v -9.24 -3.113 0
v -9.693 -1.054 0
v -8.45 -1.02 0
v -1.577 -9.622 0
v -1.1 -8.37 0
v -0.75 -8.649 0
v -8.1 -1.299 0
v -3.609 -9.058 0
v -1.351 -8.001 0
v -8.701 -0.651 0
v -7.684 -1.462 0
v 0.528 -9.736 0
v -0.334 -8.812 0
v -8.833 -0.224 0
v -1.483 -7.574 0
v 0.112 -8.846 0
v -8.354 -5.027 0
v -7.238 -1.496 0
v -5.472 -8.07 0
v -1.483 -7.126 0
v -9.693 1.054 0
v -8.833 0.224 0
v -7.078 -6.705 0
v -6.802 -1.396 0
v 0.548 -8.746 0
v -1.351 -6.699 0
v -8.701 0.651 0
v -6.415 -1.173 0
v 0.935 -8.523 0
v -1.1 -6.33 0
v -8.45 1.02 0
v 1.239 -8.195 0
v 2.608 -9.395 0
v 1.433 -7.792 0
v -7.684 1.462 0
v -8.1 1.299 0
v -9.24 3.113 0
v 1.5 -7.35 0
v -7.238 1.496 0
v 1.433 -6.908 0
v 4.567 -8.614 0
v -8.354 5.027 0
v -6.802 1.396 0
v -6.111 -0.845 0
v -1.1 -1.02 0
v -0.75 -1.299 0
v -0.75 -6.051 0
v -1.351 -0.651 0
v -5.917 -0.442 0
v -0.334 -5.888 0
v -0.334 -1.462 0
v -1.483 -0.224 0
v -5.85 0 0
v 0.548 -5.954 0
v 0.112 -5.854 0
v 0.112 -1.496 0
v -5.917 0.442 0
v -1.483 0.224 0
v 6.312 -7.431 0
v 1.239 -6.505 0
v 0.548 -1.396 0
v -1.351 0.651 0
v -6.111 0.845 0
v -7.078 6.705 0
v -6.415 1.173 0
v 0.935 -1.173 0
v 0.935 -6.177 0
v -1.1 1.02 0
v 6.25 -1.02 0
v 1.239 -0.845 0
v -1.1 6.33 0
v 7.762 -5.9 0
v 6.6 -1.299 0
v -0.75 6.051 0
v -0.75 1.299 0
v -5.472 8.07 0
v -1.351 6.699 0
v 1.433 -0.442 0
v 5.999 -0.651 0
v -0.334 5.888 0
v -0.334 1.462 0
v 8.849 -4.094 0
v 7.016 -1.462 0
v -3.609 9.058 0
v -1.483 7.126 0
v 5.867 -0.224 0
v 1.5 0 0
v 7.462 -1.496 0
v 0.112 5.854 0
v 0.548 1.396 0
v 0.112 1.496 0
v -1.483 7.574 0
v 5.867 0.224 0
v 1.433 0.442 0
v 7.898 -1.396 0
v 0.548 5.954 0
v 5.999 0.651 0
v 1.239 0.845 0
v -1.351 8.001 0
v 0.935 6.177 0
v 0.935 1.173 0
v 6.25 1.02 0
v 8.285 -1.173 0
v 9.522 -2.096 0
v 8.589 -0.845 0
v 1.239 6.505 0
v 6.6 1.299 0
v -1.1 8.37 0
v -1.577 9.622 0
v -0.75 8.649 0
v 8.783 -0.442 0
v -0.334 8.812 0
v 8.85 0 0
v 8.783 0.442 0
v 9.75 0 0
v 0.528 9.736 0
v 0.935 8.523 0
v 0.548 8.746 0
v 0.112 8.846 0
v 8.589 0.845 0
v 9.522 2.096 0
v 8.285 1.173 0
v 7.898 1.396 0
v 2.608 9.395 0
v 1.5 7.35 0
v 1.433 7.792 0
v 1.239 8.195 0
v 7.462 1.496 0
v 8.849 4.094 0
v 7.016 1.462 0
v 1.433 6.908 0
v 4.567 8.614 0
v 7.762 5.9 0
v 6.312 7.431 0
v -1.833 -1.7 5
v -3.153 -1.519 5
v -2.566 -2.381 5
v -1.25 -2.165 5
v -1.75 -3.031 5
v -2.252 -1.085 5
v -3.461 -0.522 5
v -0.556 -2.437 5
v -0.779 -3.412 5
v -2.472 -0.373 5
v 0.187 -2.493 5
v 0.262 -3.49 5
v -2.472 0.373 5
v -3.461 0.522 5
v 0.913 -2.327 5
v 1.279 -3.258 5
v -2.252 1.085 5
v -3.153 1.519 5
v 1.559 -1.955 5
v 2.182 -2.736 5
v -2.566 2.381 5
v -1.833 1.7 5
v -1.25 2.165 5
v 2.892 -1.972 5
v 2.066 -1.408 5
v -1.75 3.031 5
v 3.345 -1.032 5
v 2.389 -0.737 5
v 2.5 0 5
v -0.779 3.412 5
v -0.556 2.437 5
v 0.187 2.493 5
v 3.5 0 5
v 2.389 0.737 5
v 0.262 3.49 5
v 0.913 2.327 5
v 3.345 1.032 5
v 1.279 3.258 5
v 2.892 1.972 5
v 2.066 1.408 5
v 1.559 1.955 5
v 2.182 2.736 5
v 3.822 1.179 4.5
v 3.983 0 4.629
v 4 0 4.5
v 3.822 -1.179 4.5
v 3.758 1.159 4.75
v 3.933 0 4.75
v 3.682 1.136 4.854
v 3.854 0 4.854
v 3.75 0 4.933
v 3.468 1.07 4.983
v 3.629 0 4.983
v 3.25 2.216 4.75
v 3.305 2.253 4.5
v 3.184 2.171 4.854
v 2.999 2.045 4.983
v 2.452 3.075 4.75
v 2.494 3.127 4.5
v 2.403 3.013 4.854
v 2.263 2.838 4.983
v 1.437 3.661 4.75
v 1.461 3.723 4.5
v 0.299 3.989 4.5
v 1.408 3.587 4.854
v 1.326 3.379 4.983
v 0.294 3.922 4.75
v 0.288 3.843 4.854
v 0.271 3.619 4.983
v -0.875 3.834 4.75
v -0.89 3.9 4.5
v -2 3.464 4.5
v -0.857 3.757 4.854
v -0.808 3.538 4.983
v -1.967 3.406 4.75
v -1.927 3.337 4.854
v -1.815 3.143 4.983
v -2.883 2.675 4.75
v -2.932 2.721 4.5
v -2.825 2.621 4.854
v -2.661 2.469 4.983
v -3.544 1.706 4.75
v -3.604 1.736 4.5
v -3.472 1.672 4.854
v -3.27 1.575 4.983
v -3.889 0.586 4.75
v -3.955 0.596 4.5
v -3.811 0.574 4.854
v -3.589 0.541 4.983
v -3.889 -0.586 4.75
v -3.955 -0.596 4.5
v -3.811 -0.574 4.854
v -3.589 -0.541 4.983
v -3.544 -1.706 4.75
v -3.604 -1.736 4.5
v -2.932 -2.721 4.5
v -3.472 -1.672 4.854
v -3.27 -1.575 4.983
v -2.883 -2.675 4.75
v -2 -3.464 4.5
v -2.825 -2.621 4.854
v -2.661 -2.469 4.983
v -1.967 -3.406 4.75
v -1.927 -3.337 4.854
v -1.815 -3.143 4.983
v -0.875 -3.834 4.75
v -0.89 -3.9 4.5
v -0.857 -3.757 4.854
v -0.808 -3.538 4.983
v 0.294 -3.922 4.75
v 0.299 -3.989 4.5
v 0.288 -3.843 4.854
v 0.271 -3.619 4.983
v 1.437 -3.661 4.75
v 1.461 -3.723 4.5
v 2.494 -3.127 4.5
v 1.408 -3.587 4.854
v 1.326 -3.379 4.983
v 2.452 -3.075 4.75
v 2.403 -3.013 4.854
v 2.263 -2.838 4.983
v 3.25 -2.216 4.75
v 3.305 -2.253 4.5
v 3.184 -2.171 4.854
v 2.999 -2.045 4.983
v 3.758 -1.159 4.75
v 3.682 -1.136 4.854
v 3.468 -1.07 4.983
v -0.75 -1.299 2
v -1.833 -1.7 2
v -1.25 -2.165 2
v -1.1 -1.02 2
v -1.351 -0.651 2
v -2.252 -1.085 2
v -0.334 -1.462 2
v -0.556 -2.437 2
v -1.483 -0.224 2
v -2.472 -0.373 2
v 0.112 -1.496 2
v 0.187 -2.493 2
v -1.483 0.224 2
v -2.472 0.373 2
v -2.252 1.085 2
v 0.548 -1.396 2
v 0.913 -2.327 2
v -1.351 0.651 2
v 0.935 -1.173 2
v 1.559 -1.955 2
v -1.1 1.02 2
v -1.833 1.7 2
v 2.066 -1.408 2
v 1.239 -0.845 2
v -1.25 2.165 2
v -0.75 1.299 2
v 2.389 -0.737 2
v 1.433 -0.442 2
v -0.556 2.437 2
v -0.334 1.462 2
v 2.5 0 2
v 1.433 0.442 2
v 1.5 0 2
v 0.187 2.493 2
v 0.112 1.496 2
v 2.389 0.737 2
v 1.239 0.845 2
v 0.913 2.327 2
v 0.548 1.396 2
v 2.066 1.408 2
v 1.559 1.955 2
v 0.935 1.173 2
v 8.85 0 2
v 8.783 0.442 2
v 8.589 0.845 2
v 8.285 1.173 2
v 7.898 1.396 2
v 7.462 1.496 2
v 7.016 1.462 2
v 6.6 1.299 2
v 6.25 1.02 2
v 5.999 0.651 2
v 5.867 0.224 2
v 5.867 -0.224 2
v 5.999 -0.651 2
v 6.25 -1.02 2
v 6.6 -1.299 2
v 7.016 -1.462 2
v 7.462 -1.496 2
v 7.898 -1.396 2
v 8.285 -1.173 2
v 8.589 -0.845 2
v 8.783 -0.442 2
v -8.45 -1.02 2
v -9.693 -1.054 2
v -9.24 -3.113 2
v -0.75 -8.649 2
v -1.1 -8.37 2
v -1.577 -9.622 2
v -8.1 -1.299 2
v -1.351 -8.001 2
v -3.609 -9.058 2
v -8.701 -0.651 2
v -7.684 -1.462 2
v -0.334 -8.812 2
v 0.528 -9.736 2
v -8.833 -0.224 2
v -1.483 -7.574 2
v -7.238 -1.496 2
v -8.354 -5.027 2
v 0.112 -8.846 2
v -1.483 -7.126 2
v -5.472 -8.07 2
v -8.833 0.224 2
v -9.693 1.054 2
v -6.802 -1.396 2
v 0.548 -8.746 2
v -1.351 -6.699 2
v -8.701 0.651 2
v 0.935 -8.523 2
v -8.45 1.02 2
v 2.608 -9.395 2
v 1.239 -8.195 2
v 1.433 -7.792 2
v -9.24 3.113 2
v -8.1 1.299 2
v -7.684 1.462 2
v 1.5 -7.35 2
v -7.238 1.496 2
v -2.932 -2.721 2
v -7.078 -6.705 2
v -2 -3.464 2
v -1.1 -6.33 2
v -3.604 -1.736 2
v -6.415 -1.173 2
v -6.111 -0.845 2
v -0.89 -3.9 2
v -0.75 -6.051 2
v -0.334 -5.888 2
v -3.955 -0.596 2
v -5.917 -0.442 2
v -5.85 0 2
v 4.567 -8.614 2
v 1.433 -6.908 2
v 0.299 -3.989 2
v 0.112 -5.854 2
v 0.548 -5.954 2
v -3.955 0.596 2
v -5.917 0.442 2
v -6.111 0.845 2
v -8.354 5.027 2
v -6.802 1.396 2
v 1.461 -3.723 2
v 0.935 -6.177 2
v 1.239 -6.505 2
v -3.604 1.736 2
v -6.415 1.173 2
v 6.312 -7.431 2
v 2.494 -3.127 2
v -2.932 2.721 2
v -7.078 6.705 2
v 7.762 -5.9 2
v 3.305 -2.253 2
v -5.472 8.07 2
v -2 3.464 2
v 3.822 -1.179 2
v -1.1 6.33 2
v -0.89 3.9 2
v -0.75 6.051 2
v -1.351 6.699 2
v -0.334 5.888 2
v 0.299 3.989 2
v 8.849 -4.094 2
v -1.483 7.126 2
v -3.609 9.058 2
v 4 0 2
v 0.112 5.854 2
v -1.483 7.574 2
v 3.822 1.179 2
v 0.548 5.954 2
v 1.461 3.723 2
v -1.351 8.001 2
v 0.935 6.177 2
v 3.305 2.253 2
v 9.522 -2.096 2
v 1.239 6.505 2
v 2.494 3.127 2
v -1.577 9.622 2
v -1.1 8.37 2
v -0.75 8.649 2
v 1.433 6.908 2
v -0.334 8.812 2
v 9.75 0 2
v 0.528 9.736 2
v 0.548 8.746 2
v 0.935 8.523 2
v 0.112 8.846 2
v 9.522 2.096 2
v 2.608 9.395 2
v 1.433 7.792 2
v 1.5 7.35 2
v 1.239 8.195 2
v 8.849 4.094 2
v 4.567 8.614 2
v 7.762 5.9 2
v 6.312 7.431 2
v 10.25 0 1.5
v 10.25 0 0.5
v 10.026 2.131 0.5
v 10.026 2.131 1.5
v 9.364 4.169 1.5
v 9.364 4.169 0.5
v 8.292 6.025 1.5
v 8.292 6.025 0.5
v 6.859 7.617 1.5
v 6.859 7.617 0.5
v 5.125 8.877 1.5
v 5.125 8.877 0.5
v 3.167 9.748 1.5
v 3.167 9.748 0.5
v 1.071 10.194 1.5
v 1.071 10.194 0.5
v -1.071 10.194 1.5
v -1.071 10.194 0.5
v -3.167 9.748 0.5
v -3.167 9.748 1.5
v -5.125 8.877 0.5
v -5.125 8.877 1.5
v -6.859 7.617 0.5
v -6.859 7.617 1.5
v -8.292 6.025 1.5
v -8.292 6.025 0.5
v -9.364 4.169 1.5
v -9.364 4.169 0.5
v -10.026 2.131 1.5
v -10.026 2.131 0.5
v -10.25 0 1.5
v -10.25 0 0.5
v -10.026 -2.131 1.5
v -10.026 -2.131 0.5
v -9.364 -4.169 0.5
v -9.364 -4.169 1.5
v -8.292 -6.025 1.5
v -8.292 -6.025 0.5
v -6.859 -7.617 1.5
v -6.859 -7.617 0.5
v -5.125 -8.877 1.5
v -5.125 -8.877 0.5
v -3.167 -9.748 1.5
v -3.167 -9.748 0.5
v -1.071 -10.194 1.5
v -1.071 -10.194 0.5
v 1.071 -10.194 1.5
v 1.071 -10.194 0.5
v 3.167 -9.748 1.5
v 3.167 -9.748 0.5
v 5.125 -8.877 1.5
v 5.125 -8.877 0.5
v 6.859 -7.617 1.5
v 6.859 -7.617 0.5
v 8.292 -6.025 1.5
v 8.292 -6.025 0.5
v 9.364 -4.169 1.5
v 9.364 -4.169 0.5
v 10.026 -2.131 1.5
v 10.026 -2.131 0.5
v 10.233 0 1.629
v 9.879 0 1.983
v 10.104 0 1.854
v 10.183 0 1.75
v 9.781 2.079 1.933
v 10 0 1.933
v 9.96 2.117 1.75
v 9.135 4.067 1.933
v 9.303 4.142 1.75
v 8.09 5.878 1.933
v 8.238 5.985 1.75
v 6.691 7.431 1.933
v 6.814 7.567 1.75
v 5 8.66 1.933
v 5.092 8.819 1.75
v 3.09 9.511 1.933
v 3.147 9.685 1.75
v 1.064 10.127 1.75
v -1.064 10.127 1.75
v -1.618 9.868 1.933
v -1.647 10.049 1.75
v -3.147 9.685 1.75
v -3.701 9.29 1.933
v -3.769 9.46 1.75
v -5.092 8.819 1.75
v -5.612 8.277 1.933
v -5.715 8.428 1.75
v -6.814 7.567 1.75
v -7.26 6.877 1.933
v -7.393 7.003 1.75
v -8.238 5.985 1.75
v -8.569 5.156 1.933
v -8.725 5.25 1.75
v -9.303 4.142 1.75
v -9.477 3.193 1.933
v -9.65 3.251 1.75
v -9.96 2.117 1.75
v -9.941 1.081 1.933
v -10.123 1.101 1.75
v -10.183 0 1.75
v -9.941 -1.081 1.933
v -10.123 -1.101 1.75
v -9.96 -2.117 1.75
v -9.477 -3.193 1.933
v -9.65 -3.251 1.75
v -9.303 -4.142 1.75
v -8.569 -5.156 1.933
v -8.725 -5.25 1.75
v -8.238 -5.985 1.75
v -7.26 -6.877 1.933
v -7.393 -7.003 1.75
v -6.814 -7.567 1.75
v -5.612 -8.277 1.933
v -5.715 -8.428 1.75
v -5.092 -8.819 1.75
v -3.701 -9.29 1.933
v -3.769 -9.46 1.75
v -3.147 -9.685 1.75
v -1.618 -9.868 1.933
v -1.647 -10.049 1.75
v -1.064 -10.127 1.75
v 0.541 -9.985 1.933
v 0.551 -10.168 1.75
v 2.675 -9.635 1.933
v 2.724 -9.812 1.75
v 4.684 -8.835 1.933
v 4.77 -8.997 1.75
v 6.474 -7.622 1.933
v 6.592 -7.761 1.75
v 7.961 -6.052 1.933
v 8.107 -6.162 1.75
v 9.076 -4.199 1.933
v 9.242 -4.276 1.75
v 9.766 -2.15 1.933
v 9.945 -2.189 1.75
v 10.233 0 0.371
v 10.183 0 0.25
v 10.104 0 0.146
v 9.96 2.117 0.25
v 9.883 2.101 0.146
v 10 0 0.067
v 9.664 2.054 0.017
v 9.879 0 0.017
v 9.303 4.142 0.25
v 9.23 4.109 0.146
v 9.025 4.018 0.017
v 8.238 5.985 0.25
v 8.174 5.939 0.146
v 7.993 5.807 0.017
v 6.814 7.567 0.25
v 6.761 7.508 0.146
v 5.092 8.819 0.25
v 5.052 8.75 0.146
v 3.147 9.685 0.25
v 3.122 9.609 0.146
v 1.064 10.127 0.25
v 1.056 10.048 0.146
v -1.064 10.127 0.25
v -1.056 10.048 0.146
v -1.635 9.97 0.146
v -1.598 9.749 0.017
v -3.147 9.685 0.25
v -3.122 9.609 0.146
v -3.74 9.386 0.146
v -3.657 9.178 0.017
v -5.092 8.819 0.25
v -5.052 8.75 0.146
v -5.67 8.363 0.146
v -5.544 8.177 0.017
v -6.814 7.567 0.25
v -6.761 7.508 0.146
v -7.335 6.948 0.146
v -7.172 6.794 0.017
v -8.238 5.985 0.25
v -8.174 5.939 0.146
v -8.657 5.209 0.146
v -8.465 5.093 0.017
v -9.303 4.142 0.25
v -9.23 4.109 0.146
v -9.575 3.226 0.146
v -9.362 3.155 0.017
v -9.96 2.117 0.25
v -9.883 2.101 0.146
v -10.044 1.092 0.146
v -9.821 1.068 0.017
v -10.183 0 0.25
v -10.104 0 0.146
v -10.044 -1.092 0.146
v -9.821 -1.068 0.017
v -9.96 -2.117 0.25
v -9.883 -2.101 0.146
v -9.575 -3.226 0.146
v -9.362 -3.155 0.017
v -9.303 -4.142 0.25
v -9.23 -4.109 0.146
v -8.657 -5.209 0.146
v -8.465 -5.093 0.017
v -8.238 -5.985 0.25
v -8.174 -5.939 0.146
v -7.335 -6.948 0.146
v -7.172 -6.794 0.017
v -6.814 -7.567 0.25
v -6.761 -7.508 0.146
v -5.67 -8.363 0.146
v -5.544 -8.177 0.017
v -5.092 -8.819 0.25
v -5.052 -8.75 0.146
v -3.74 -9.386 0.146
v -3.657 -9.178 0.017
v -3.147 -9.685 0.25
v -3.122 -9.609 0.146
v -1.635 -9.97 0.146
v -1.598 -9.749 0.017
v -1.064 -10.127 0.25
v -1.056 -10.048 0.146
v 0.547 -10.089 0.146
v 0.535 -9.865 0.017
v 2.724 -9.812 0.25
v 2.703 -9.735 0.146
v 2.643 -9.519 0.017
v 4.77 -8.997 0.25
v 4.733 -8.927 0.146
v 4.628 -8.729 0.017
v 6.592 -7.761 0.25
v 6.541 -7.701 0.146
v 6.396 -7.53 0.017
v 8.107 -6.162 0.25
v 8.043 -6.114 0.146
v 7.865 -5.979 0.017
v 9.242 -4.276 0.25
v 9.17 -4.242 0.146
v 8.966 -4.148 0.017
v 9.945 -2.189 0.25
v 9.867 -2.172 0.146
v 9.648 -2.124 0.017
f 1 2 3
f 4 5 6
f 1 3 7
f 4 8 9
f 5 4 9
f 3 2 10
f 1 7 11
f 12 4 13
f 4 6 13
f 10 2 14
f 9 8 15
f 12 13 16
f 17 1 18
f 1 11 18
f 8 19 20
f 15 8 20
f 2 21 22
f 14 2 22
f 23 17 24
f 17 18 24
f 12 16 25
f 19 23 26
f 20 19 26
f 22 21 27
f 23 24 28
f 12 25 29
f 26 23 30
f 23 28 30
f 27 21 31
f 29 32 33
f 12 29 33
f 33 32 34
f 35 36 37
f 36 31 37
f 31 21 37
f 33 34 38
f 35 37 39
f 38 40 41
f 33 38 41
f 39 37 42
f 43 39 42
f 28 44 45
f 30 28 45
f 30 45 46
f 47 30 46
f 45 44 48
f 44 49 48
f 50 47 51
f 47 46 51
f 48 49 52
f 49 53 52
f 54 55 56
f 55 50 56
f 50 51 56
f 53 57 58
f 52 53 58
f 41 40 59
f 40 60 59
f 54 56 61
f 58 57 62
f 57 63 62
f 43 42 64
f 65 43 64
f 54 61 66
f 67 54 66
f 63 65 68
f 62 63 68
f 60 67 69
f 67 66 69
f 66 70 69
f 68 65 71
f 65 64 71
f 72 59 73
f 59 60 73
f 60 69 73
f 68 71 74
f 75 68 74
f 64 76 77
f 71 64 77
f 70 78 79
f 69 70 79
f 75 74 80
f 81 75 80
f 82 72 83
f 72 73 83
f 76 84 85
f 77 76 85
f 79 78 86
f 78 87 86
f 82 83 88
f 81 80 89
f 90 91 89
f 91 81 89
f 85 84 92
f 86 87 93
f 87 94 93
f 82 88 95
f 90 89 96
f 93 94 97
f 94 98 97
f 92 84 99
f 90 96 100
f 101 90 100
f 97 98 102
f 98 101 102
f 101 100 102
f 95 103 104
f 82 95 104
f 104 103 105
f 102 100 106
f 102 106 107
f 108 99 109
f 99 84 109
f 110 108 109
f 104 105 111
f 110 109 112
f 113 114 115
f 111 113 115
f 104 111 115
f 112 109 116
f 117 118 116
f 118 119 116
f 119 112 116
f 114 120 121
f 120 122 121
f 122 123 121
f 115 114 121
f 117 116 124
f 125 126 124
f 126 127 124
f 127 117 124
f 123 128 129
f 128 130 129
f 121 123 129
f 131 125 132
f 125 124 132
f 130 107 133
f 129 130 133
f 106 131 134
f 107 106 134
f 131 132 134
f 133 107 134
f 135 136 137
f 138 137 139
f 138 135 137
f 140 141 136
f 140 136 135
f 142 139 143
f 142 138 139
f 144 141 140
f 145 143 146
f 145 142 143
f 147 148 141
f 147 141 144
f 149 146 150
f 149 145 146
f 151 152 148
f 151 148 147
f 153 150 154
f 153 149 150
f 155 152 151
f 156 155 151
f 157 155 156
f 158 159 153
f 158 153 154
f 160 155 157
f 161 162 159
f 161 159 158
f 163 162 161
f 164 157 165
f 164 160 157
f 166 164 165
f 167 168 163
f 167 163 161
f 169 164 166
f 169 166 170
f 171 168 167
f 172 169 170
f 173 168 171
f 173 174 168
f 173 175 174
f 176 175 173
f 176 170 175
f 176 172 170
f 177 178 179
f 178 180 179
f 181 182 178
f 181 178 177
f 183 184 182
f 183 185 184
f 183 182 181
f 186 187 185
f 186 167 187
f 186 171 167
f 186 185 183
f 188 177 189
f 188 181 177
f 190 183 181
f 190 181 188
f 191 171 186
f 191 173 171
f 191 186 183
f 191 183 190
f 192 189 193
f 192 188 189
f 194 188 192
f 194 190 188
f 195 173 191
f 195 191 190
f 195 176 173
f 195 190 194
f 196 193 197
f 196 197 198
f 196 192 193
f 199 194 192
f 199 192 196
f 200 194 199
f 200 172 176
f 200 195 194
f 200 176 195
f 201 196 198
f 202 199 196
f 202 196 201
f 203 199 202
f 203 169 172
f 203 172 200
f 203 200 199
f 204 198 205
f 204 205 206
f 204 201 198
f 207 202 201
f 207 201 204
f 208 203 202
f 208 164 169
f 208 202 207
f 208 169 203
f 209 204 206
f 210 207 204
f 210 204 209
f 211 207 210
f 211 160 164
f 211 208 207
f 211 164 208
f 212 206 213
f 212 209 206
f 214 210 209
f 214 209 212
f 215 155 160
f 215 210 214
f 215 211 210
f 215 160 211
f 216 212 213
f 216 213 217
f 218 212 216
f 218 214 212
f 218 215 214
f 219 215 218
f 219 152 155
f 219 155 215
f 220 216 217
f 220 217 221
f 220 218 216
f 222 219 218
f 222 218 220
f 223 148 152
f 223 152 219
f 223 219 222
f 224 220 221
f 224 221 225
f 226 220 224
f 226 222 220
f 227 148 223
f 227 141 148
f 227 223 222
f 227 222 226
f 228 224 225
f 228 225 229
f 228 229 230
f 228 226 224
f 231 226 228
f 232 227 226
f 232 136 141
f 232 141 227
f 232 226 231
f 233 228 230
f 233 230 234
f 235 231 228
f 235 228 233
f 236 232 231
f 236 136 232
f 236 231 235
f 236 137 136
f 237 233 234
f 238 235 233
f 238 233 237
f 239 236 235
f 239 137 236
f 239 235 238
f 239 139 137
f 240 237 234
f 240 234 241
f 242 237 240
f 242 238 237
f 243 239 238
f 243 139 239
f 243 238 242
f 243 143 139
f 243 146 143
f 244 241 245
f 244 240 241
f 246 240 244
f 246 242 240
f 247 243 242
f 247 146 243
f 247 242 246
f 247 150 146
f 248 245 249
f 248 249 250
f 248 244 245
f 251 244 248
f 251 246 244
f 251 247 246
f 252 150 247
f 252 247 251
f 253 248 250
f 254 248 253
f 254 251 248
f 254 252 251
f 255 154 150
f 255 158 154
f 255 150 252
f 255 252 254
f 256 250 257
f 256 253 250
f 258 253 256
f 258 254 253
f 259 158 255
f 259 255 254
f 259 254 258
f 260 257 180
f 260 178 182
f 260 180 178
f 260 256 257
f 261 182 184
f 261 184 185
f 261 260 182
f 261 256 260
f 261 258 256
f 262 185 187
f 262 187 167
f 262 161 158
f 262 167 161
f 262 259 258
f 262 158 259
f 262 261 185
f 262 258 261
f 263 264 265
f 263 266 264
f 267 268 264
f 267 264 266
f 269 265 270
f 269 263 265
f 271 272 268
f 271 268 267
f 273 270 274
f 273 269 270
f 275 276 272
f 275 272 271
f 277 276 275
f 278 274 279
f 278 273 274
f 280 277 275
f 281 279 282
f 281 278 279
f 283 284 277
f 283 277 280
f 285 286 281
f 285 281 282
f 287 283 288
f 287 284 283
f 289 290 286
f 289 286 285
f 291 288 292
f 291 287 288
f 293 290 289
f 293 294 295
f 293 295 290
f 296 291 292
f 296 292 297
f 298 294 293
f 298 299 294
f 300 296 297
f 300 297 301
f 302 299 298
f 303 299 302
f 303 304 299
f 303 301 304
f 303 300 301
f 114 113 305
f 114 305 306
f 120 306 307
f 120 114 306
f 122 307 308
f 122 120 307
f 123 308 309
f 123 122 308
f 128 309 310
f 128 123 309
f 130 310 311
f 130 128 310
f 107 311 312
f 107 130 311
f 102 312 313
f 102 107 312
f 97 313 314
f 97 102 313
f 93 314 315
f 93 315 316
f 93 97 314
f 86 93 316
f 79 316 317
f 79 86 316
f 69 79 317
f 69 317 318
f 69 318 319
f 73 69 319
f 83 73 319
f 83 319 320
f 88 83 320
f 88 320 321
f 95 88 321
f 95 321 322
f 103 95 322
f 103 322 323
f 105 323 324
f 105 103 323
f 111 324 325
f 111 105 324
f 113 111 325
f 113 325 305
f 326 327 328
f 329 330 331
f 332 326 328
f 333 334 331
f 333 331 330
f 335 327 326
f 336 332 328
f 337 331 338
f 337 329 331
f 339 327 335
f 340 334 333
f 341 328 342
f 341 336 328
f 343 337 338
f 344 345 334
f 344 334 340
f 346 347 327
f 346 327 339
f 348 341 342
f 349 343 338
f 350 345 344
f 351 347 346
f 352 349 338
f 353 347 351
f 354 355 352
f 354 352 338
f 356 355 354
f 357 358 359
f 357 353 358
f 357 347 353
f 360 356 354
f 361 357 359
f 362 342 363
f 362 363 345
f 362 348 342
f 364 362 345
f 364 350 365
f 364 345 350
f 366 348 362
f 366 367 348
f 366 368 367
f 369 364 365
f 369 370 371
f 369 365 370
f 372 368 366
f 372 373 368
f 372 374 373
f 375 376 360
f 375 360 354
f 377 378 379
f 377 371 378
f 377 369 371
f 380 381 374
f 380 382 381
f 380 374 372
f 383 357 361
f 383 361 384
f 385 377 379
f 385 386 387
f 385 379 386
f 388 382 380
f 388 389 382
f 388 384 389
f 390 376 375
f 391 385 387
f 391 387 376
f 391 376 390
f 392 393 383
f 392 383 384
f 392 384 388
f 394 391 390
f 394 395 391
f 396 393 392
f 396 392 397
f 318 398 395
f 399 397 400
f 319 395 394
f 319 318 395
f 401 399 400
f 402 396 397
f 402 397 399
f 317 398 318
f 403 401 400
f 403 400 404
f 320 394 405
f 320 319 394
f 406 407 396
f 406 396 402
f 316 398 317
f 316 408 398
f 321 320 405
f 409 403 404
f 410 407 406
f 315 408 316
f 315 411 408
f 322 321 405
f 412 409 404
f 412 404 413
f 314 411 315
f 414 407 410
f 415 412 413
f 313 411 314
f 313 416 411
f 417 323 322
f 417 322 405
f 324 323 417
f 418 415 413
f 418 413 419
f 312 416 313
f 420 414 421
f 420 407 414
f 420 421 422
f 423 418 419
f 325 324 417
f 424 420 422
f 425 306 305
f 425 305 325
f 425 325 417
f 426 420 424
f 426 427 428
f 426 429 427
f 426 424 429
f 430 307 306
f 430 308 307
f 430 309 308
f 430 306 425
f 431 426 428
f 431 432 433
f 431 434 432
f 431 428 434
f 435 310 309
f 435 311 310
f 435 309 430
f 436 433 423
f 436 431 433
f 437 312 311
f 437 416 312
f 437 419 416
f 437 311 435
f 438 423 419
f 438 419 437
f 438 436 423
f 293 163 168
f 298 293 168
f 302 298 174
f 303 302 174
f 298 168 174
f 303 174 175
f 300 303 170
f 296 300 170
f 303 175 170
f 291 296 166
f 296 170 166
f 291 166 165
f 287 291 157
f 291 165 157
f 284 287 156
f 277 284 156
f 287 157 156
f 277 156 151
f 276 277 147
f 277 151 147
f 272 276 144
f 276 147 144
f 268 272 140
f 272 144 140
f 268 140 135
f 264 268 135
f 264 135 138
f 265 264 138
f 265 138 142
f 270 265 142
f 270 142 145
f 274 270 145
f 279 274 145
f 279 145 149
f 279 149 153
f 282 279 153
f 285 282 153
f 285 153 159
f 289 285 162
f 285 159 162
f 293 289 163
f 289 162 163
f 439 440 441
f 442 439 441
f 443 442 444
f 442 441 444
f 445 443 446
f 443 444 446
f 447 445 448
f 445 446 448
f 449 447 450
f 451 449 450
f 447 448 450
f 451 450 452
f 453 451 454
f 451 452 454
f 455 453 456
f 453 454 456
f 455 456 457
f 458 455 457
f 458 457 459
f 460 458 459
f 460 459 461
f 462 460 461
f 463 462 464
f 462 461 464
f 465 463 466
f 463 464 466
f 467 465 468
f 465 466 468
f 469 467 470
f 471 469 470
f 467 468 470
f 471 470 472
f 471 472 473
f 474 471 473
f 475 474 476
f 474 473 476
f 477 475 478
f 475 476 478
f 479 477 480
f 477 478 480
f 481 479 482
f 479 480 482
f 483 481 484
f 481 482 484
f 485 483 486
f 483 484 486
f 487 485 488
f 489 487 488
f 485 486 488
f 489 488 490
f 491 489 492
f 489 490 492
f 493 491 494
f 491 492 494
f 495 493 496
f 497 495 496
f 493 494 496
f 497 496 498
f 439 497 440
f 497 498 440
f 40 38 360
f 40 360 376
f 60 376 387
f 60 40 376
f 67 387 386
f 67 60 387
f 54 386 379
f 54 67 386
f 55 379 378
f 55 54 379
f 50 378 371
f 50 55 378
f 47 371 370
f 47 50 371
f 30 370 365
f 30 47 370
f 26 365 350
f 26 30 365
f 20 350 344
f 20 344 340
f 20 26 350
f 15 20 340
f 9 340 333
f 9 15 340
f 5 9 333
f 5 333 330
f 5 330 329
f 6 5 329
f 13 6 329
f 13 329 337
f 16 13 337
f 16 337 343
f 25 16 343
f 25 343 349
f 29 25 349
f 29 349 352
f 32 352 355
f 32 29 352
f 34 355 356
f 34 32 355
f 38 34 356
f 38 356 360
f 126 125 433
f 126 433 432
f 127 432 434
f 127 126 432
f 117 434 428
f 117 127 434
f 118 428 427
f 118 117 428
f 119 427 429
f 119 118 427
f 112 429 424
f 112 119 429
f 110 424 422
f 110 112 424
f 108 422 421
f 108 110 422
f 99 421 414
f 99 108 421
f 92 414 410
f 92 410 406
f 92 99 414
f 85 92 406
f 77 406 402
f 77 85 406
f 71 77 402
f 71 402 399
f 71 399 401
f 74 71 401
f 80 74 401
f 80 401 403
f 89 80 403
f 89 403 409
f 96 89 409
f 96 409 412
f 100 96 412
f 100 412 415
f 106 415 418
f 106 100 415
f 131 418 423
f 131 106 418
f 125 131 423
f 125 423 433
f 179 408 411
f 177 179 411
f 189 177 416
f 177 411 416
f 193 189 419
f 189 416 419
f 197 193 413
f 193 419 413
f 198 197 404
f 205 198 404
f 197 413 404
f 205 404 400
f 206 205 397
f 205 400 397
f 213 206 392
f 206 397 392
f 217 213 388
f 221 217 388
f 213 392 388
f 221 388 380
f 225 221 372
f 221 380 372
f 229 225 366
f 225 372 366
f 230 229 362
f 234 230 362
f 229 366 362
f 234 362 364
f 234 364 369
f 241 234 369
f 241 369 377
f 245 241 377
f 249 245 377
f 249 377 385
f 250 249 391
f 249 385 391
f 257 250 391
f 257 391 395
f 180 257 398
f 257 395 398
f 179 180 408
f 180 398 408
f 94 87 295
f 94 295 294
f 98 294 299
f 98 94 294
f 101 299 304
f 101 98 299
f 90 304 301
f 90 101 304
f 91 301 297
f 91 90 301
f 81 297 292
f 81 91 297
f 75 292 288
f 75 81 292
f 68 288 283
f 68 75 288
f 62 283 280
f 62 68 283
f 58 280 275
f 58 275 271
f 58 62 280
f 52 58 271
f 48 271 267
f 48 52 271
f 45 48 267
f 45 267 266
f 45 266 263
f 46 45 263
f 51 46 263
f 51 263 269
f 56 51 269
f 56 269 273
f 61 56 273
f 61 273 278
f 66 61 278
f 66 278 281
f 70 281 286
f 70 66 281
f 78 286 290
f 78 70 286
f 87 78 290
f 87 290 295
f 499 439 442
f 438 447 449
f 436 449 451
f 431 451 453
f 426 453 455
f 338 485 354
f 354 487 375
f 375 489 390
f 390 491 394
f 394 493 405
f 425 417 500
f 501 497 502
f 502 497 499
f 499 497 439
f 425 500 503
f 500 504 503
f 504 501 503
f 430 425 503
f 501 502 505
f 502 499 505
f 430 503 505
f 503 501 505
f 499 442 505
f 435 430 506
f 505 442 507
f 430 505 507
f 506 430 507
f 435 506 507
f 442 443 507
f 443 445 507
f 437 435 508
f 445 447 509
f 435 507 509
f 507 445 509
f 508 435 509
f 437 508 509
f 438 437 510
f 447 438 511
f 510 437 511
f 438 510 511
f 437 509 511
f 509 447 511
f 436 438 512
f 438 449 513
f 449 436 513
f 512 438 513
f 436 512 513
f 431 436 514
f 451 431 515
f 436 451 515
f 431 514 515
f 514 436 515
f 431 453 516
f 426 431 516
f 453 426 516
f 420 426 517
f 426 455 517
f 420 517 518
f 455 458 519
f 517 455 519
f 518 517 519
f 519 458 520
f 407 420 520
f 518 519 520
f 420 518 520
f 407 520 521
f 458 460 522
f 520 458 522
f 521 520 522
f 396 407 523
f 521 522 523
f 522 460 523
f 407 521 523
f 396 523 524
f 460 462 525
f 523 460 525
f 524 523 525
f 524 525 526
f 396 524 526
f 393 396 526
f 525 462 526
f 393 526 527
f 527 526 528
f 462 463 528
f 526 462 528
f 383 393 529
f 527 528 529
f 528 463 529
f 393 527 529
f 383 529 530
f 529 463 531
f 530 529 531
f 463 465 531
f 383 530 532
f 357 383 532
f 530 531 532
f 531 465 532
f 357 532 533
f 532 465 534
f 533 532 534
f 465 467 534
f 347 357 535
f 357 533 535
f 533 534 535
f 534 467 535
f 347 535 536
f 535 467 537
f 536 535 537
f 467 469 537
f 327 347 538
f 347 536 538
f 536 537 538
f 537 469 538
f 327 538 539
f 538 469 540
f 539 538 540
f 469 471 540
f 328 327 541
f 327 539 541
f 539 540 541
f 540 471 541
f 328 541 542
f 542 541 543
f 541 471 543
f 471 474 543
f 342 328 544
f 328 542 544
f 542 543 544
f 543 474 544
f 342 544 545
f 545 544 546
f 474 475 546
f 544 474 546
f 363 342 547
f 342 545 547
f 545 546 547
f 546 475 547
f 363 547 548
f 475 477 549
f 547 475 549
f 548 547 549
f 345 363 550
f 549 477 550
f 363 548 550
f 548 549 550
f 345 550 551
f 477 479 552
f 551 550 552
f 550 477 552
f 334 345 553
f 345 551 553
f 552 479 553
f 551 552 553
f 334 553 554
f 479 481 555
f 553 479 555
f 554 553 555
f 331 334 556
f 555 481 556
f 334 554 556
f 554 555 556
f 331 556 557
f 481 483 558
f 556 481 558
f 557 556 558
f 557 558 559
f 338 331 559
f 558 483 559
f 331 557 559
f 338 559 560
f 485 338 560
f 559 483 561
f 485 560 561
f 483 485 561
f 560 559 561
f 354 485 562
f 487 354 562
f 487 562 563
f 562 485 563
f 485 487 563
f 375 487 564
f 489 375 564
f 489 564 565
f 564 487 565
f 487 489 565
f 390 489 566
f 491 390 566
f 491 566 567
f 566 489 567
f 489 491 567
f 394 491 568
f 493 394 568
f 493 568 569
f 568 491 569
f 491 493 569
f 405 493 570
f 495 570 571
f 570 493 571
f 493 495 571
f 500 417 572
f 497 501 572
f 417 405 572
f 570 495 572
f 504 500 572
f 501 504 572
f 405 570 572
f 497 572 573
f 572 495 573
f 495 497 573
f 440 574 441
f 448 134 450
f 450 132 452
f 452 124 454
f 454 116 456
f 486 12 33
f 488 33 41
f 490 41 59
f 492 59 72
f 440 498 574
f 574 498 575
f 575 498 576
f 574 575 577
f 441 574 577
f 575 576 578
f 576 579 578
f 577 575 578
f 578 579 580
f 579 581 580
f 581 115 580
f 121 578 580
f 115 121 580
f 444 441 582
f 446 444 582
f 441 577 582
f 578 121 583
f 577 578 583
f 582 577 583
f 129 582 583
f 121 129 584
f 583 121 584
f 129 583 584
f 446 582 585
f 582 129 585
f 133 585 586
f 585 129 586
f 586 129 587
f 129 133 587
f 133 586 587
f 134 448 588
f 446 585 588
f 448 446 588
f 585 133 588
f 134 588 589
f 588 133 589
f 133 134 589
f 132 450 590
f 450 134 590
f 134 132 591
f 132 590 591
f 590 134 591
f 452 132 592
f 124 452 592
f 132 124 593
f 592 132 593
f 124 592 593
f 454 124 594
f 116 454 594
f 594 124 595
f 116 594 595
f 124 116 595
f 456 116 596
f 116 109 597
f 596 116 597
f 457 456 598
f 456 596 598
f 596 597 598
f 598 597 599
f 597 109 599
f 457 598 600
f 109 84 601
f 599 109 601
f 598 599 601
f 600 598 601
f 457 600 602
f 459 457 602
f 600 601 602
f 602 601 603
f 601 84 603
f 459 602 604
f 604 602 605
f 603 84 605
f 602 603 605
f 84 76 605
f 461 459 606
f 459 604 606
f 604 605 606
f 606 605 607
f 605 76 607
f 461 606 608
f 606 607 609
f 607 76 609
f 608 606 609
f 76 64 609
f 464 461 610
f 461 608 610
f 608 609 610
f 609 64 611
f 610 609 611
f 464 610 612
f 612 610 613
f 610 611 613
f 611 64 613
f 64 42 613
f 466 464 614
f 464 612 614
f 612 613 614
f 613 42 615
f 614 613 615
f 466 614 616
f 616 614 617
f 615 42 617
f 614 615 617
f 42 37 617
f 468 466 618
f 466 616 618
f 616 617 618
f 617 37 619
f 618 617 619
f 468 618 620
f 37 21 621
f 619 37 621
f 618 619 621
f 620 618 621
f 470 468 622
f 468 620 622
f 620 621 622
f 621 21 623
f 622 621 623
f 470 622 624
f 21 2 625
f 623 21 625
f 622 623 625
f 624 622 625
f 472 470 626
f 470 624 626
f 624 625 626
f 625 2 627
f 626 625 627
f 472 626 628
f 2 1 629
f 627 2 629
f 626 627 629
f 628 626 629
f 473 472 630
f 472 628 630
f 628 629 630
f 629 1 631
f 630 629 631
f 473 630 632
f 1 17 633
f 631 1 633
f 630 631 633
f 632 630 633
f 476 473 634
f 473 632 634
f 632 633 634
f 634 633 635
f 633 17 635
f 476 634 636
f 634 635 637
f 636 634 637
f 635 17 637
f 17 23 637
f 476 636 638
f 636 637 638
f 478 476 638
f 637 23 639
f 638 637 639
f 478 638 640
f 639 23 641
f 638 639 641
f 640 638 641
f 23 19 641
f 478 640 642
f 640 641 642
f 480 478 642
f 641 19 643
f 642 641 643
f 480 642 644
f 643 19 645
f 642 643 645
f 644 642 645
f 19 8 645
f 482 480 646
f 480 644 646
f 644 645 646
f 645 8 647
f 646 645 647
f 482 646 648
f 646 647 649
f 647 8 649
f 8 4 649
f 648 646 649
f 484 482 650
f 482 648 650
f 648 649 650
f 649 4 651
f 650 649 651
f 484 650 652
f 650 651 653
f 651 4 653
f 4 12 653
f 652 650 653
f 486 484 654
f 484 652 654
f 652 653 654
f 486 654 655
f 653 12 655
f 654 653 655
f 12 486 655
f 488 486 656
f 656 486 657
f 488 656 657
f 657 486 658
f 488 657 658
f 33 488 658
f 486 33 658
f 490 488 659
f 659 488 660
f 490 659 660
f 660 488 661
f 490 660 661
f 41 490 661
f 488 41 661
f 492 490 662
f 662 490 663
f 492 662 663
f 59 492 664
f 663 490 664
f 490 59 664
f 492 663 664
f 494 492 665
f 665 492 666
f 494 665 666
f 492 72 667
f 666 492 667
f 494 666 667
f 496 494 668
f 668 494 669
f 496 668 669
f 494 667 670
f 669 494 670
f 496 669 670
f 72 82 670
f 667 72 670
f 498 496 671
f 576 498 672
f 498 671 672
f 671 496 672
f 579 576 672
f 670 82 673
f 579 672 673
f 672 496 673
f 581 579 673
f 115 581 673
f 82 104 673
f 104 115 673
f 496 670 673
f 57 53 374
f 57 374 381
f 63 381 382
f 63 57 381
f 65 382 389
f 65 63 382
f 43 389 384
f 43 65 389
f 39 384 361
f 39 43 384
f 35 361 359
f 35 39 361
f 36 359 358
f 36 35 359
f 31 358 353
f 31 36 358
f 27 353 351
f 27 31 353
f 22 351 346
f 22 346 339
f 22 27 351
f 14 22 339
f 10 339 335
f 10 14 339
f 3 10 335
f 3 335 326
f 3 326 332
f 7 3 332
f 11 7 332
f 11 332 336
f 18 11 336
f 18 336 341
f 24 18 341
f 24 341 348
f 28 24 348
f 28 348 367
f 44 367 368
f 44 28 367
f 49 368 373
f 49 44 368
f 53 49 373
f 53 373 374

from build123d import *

# Parameters (mm, degrees)
SKETCH_1_R          = 10.25
SKETCH_1_R_2        = 1.5
EXTRUDE_1_DEPTH     = 2
SKETCH_2_R          = 4
EXTRUDE_2_DEPTH     = 3
SKETCH_3_R          = 2.5
CUT_EXTRUDE_1_DEPTH = 3
FILLET_1_R          = 0.5
FILLET_2_R          = 0.5
FILLET_3_R          = 0.5


with BuildPart() as part:
    # 草图1 → 凸台-拉伸1 (new body)
    with BuildSketch(Plane.XY):
        Circle(SKETCH_1_R)
        Circle(SKETCH_1_R_2, mode=Mode.SUBTRACT)
        with Locations((-7.35, 0)):
            Circle(SKETCH_1_R_2, mode=Mode.SUBTRACT)
        with Locations((7.35, 0)):
            Circle(SKETCH_1_R_2, mode=Mode.SUBTRACT)
        with Locations((0, 7.35)):
            Circle(SKETCH_1_R_2, mode=Mode.SUBTRACT)
        with Locations((0, -7.35)):
            Circle(SKETCH_1_R_2, mode=Mode.SUBTRACT)
    extrude(amount=EXTRUDE_1_DEPTH)

    # 草图2 → 凸台-拉伸2 (add)
    with BuildSketch(Plane.XY.offset(2)):
        Circle(SKETCH_2_R)
    extrude(amount=EXTRUDE_2_DEPTH)

    # 草图3 → 切除-拉伸1 (cut)
    with BuildSketch(Plane.XY.offset(5)):
        Circle(SKETCH_3_R)
    extrude(amount=-CUT_EXTRUDE_1_DEPTH, mode=Mode.SUBTRACT)

    # 圆角1
    fillet_1_edges = [part.edges().sort_by_distance(p)[0] for p in [
        (-10.25, 0, 2),
    ]]
    fillet(fillet_1_edges, radius=FILLET_1_R)

    # 圆角2
    fillet_2_edges = [part.edges().sort_by_distance(p)[0] for p in [
        (-10.25, 0, 0),
    ]]
    fillet(fillet_2_edges, radius=FILLET_2_R)

    # 圆角3
    fillet_3_edges = [part.edges().sort_by_distance(p)[0] for p in [
        (-4, 0, 5),
    ]]
    fillet(fillet_3_edges, radius=FILLET_3_R)


solid = part.part
